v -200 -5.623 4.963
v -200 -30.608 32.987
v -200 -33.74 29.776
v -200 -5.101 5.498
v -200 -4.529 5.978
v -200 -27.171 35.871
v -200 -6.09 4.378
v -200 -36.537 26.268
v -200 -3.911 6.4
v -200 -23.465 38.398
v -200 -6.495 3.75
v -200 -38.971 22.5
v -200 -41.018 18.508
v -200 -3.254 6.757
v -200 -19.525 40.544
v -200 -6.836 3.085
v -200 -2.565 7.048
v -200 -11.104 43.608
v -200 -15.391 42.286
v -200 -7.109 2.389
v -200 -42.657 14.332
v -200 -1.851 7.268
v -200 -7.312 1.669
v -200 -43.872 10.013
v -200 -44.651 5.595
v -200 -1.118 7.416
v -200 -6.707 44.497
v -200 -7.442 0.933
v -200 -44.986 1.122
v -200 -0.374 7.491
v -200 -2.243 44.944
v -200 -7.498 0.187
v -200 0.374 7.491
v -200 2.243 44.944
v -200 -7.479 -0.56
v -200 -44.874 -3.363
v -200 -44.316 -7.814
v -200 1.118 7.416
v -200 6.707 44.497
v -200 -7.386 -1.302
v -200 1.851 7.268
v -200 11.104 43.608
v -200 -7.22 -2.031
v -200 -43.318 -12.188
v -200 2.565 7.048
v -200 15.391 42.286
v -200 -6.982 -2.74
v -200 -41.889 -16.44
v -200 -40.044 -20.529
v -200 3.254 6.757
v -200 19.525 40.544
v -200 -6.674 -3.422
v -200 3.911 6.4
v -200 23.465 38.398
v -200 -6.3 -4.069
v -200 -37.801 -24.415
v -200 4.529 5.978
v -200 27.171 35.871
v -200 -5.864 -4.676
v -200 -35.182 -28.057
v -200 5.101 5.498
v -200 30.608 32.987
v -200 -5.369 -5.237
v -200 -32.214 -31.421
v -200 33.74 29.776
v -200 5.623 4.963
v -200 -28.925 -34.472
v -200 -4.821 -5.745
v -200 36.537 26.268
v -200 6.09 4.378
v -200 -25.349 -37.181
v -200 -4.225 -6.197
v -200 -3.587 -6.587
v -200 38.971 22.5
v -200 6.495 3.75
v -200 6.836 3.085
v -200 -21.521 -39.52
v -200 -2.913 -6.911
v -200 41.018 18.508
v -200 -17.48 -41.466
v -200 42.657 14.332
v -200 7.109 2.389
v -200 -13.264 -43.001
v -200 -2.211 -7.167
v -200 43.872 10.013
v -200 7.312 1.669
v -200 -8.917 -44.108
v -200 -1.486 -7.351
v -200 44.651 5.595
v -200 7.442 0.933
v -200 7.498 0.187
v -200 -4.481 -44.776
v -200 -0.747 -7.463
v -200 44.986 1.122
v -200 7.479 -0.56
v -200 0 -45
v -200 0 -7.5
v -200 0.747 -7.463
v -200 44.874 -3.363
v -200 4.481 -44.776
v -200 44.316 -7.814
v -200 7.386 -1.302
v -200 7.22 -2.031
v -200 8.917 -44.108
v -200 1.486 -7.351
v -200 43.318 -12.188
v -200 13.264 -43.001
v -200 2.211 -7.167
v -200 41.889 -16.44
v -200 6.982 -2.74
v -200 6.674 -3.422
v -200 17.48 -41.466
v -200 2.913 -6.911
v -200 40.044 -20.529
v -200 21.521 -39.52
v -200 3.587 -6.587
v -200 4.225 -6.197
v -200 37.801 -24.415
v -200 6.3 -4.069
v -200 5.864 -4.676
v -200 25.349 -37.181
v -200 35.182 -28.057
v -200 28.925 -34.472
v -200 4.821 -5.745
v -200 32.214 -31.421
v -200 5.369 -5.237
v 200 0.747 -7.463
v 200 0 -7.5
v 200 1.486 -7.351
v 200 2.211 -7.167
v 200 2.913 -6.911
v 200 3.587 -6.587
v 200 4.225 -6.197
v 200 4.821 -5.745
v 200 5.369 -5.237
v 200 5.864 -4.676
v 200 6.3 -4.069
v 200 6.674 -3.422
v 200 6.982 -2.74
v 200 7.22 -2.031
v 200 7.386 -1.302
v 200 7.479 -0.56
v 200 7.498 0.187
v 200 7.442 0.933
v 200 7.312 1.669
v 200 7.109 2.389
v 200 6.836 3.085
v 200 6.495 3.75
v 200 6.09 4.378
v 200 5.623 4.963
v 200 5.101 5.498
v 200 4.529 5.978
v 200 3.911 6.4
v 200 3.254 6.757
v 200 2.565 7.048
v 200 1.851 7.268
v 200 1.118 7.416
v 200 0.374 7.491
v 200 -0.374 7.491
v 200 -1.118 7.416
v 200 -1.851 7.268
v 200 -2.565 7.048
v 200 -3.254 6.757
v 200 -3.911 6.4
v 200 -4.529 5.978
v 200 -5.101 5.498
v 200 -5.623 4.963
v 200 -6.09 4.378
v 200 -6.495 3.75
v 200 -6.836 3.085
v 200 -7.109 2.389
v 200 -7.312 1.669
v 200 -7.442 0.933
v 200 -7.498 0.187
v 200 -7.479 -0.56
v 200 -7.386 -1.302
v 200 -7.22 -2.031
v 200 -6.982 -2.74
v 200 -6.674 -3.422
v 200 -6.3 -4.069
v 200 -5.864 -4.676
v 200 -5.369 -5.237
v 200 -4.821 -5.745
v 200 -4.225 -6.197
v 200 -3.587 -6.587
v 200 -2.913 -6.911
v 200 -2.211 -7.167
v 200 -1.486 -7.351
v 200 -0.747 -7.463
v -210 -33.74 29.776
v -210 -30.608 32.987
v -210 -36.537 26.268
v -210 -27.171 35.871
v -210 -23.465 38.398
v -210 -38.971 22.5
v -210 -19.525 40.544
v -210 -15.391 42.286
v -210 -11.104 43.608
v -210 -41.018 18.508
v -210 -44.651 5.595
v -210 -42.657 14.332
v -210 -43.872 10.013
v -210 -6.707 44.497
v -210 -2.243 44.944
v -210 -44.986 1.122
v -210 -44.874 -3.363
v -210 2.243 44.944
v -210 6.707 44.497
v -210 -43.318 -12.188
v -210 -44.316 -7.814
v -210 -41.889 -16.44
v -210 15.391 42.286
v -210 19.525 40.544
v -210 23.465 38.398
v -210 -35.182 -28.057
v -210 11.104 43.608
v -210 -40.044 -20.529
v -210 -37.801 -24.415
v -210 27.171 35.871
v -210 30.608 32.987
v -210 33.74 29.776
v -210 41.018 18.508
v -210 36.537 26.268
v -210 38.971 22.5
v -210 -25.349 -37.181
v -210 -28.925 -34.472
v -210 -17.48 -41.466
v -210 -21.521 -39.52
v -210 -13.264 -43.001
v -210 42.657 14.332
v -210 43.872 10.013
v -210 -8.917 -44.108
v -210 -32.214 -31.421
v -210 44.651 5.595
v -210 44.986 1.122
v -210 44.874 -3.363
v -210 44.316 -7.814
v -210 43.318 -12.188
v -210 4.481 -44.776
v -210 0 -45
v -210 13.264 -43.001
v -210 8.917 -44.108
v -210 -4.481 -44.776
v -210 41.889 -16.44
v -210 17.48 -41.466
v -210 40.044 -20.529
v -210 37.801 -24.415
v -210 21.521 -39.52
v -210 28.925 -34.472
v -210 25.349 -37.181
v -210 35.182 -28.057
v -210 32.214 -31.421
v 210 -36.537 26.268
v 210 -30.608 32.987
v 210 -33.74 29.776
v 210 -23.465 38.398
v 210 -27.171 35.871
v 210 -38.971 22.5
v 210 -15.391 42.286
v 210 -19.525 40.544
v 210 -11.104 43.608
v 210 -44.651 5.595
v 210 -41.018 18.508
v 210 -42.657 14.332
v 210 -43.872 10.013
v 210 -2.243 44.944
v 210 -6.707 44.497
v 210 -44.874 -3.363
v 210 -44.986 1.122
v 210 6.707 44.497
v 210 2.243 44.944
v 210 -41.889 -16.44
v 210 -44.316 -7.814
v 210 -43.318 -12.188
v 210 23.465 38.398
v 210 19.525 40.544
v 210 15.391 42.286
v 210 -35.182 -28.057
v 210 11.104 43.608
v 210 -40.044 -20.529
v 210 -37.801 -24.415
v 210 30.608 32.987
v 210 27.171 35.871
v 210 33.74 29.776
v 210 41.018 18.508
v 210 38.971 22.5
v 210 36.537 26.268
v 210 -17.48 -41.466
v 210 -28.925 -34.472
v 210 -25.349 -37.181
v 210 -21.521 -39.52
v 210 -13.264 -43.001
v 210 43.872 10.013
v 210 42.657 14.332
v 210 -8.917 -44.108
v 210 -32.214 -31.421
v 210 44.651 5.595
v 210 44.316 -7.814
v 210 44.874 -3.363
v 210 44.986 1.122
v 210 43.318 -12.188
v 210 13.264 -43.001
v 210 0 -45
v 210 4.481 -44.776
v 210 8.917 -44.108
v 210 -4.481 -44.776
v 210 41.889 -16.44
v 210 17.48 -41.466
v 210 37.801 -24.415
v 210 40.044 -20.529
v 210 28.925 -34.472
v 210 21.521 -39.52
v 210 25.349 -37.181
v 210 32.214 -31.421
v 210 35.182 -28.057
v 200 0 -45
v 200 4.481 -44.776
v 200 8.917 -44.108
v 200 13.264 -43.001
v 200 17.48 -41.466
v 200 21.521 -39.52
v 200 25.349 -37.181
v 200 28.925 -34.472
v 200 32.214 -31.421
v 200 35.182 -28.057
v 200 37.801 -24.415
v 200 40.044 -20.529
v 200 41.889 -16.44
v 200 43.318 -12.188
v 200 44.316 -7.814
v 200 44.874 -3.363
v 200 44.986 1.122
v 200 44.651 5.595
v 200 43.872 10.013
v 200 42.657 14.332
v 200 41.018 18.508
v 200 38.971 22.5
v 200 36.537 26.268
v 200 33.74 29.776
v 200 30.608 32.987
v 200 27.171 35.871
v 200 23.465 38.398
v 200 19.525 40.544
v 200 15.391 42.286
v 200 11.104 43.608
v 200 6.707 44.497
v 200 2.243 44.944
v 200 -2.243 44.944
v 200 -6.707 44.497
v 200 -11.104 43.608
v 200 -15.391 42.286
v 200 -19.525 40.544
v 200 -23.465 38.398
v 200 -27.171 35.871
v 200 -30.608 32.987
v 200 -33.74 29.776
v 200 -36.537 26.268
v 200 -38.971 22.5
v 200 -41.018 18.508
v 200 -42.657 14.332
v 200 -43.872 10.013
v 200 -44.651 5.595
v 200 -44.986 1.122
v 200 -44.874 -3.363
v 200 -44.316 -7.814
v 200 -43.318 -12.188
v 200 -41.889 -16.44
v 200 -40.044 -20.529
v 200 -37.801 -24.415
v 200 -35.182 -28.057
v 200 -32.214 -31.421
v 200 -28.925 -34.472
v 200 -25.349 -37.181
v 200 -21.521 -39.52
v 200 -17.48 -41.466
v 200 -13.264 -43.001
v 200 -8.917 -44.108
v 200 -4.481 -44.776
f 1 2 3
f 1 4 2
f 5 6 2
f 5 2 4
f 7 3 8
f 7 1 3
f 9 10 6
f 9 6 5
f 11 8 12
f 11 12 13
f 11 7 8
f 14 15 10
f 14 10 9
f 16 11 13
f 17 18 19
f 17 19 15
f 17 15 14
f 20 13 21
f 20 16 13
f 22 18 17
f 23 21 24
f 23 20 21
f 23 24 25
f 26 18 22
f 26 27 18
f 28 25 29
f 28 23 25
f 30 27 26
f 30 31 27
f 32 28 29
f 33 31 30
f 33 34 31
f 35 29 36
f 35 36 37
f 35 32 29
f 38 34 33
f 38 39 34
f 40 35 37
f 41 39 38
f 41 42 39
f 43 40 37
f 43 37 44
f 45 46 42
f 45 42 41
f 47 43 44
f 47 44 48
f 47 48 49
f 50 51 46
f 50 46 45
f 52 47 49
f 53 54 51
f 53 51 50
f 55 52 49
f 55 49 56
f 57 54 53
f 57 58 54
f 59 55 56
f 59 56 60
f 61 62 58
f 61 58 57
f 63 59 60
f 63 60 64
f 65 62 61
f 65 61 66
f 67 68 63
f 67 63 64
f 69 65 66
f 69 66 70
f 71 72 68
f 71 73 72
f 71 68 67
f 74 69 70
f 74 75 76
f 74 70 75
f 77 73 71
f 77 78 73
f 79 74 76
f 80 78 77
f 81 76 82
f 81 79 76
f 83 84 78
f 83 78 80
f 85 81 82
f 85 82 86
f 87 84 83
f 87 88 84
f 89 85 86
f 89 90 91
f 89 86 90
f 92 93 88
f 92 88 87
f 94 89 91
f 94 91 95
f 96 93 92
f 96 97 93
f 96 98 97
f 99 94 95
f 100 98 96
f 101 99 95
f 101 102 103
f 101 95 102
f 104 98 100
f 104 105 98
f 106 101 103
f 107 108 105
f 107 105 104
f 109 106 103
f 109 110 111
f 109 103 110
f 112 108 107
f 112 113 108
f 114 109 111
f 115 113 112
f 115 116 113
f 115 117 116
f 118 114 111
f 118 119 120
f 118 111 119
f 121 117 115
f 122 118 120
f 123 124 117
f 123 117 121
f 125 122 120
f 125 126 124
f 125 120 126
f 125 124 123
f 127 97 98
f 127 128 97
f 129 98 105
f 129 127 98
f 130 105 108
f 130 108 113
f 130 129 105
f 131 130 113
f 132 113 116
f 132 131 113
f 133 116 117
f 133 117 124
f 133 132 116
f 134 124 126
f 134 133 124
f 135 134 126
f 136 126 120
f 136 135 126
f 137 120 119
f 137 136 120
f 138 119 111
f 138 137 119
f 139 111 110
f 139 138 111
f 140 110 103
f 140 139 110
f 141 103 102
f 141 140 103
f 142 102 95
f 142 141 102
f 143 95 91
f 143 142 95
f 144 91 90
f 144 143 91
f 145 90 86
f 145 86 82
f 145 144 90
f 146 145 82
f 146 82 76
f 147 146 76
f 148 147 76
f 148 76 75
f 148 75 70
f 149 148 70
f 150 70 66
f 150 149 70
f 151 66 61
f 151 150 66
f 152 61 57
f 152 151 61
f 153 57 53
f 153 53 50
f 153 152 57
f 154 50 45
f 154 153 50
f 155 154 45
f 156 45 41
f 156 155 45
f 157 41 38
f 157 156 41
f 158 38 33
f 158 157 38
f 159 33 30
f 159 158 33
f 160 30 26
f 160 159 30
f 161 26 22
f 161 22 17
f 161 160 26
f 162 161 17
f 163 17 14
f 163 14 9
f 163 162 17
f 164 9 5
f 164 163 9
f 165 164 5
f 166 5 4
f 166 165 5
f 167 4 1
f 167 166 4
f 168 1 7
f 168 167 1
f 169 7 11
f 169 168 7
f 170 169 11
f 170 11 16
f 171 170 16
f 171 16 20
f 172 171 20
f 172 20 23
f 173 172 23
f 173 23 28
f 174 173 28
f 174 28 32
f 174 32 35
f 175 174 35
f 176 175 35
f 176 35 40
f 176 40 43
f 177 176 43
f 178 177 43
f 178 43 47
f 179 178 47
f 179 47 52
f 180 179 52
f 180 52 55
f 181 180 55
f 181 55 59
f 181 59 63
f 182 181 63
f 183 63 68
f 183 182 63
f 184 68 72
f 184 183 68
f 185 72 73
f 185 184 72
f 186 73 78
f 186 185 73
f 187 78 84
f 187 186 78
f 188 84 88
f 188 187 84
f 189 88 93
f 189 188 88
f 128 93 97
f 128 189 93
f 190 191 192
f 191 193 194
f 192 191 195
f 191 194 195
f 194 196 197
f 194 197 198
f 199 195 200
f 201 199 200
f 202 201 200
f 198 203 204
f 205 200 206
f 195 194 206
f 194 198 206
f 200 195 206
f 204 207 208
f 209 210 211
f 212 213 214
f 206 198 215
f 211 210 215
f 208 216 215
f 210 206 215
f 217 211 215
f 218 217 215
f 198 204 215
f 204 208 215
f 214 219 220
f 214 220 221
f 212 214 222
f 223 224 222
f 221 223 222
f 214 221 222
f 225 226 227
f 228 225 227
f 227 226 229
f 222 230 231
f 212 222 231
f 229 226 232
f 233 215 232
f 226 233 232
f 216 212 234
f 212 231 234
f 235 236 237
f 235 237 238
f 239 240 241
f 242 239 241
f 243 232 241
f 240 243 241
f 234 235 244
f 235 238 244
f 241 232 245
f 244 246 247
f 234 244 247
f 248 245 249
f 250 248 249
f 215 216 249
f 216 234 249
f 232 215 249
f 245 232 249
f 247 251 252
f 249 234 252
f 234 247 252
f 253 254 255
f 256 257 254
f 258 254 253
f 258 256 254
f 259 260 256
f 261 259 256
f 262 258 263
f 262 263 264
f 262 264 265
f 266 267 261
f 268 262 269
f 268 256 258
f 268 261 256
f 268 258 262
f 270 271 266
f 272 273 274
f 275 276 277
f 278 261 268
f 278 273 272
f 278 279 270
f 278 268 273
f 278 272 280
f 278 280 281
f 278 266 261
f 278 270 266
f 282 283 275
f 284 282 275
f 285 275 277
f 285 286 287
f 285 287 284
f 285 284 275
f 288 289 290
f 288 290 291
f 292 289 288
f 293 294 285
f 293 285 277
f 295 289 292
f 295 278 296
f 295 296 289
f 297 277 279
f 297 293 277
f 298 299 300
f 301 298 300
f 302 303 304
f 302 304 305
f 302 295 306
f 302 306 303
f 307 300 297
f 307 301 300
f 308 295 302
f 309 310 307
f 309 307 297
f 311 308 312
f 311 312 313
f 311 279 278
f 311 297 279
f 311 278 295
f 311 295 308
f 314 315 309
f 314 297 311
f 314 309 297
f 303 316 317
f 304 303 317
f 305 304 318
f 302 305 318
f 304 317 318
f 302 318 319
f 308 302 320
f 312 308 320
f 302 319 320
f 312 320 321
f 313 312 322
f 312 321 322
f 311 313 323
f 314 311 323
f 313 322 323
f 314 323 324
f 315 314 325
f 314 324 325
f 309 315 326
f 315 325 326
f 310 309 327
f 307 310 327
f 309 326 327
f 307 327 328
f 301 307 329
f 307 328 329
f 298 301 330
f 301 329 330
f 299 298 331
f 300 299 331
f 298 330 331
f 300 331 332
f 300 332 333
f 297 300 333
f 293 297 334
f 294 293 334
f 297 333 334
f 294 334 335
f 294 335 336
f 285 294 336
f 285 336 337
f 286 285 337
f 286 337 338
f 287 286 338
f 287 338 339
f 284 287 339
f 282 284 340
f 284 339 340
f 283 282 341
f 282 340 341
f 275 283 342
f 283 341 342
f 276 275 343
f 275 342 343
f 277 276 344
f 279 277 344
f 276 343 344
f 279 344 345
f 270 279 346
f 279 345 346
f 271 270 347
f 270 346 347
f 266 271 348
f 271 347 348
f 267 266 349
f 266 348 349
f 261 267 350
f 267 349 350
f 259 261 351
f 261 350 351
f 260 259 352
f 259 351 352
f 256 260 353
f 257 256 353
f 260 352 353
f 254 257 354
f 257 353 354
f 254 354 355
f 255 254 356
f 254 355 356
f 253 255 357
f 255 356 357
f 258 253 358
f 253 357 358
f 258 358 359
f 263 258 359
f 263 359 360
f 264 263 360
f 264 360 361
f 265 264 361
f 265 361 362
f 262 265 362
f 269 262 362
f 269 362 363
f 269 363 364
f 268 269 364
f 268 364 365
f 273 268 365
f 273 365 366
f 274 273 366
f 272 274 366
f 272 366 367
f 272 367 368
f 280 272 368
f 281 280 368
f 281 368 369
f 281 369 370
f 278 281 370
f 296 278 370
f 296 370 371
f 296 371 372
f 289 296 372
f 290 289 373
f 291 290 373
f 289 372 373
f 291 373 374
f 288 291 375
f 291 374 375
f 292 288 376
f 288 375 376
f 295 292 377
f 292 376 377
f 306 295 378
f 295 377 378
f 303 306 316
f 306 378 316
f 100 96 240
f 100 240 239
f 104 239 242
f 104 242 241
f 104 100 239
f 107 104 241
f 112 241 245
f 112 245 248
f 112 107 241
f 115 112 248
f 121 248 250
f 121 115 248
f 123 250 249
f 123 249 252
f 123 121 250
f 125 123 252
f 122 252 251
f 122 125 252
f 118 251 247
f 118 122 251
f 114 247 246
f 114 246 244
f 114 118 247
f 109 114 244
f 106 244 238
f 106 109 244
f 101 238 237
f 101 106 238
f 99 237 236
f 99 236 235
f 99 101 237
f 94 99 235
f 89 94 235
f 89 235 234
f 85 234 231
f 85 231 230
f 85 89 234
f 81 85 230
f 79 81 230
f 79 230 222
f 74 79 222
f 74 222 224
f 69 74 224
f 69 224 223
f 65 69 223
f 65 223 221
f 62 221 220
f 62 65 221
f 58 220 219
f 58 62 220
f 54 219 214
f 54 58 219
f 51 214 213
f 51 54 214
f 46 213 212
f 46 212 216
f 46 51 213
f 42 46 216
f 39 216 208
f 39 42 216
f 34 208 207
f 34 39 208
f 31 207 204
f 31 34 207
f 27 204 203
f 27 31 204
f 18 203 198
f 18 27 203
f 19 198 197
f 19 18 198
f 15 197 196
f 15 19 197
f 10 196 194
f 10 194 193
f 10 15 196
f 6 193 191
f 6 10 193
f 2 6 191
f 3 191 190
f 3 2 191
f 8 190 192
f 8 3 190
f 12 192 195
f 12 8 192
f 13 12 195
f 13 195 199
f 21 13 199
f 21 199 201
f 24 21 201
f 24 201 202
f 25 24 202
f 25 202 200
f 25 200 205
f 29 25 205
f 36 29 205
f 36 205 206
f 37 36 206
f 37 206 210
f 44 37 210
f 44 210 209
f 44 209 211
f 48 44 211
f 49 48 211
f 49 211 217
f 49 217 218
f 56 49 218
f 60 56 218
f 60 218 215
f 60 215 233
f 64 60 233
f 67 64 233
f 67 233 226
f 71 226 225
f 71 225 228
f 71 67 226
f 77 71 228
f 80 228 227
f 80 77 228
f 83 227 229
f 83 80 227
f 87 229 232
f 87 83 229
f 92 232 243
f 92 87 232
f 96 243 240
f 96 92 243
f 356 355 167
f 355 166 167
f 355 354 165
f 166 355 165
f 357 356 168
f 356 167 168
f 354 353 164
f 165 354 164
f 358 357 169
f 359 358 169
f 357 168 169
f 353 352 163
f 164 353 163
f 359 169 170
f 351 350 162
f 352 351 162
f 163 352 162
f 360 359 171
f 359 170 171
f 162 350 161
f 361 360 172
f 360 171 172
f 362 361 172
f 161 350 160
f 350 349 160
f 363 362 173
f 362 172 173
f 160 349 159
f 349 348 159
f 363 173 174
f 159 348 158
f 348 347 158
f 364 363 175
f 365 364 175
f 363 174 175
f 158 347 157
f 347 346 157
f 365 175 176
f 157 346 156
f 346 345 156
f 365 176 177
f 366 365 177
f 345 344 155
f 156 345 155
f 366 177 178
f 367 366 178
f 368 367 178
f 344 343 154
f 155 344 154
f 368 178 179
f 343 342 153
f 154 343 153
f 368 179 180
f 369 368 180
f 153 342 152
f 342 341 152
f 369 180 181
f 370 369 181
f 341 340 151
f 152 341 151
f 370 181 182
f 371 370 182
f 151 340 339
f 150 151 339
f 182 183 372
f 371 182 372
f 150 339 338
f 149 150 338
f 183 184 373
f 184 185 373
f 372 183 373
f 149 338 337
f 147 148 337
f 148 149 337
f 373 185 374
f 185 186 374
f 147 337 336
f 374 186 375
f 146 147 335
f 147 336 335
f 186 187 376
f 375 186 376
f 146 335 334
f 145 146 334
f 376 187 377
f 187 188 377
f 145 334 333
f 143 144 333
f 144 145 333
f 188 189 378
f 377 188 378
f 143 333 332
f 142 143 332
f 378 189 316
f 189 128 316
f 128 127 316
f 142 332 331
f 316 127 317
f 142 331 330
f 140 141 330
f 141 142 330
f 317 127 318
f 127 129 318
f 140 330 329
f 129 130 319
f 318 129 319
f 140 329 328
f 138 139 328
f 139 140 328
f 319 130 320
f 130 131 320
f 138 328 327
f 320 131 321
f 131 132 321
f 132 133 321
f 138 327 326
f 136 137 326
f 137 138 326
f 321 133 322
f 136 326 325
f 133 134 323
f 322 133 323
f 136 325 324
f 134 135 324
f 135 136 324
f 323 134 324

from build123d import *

# Parameters (mm, degrees)
SKETCH1_R           = 7.5
BOSS_EXTRUDE1_DEPTH = 200
SKETCH2_R           = 45
BOSS_EXTRUDE2_DEPTH = 10


with BuildPart() as part:
    # Sketch1 → Boss-Extrude1 (new body, symmetric)
    with BuildSketch(Plane(origin=(0, 0, 0), x_dir=(0, 0, -1), z_dir=(1, 0, 0))):
        Circle(SKETCH1_R)
    extrude(amount=BOSS_EXTRUDE1_DEPTH, both=True)

    # Sketch2 → Boss-Extrude2 (add)
    with BuildSketch(Plane(origin=(200, 0, 0), x_dir=(0, 0, -1), z_dir=(1, 0, 0))):
        Circle(SKETCH2_R)
    boss_extrude2 = extrude(amount=BOSS_EXTRUDE2_DEPTH)

    # Mirror1: Boss-Extrude2 across plane
    add(boss_extrude2.mirror(Plane(origin=(0, 0, 0), x_dir=(0, 0, 1), z_dir=(1, 0, 0))))


solid = part.part
